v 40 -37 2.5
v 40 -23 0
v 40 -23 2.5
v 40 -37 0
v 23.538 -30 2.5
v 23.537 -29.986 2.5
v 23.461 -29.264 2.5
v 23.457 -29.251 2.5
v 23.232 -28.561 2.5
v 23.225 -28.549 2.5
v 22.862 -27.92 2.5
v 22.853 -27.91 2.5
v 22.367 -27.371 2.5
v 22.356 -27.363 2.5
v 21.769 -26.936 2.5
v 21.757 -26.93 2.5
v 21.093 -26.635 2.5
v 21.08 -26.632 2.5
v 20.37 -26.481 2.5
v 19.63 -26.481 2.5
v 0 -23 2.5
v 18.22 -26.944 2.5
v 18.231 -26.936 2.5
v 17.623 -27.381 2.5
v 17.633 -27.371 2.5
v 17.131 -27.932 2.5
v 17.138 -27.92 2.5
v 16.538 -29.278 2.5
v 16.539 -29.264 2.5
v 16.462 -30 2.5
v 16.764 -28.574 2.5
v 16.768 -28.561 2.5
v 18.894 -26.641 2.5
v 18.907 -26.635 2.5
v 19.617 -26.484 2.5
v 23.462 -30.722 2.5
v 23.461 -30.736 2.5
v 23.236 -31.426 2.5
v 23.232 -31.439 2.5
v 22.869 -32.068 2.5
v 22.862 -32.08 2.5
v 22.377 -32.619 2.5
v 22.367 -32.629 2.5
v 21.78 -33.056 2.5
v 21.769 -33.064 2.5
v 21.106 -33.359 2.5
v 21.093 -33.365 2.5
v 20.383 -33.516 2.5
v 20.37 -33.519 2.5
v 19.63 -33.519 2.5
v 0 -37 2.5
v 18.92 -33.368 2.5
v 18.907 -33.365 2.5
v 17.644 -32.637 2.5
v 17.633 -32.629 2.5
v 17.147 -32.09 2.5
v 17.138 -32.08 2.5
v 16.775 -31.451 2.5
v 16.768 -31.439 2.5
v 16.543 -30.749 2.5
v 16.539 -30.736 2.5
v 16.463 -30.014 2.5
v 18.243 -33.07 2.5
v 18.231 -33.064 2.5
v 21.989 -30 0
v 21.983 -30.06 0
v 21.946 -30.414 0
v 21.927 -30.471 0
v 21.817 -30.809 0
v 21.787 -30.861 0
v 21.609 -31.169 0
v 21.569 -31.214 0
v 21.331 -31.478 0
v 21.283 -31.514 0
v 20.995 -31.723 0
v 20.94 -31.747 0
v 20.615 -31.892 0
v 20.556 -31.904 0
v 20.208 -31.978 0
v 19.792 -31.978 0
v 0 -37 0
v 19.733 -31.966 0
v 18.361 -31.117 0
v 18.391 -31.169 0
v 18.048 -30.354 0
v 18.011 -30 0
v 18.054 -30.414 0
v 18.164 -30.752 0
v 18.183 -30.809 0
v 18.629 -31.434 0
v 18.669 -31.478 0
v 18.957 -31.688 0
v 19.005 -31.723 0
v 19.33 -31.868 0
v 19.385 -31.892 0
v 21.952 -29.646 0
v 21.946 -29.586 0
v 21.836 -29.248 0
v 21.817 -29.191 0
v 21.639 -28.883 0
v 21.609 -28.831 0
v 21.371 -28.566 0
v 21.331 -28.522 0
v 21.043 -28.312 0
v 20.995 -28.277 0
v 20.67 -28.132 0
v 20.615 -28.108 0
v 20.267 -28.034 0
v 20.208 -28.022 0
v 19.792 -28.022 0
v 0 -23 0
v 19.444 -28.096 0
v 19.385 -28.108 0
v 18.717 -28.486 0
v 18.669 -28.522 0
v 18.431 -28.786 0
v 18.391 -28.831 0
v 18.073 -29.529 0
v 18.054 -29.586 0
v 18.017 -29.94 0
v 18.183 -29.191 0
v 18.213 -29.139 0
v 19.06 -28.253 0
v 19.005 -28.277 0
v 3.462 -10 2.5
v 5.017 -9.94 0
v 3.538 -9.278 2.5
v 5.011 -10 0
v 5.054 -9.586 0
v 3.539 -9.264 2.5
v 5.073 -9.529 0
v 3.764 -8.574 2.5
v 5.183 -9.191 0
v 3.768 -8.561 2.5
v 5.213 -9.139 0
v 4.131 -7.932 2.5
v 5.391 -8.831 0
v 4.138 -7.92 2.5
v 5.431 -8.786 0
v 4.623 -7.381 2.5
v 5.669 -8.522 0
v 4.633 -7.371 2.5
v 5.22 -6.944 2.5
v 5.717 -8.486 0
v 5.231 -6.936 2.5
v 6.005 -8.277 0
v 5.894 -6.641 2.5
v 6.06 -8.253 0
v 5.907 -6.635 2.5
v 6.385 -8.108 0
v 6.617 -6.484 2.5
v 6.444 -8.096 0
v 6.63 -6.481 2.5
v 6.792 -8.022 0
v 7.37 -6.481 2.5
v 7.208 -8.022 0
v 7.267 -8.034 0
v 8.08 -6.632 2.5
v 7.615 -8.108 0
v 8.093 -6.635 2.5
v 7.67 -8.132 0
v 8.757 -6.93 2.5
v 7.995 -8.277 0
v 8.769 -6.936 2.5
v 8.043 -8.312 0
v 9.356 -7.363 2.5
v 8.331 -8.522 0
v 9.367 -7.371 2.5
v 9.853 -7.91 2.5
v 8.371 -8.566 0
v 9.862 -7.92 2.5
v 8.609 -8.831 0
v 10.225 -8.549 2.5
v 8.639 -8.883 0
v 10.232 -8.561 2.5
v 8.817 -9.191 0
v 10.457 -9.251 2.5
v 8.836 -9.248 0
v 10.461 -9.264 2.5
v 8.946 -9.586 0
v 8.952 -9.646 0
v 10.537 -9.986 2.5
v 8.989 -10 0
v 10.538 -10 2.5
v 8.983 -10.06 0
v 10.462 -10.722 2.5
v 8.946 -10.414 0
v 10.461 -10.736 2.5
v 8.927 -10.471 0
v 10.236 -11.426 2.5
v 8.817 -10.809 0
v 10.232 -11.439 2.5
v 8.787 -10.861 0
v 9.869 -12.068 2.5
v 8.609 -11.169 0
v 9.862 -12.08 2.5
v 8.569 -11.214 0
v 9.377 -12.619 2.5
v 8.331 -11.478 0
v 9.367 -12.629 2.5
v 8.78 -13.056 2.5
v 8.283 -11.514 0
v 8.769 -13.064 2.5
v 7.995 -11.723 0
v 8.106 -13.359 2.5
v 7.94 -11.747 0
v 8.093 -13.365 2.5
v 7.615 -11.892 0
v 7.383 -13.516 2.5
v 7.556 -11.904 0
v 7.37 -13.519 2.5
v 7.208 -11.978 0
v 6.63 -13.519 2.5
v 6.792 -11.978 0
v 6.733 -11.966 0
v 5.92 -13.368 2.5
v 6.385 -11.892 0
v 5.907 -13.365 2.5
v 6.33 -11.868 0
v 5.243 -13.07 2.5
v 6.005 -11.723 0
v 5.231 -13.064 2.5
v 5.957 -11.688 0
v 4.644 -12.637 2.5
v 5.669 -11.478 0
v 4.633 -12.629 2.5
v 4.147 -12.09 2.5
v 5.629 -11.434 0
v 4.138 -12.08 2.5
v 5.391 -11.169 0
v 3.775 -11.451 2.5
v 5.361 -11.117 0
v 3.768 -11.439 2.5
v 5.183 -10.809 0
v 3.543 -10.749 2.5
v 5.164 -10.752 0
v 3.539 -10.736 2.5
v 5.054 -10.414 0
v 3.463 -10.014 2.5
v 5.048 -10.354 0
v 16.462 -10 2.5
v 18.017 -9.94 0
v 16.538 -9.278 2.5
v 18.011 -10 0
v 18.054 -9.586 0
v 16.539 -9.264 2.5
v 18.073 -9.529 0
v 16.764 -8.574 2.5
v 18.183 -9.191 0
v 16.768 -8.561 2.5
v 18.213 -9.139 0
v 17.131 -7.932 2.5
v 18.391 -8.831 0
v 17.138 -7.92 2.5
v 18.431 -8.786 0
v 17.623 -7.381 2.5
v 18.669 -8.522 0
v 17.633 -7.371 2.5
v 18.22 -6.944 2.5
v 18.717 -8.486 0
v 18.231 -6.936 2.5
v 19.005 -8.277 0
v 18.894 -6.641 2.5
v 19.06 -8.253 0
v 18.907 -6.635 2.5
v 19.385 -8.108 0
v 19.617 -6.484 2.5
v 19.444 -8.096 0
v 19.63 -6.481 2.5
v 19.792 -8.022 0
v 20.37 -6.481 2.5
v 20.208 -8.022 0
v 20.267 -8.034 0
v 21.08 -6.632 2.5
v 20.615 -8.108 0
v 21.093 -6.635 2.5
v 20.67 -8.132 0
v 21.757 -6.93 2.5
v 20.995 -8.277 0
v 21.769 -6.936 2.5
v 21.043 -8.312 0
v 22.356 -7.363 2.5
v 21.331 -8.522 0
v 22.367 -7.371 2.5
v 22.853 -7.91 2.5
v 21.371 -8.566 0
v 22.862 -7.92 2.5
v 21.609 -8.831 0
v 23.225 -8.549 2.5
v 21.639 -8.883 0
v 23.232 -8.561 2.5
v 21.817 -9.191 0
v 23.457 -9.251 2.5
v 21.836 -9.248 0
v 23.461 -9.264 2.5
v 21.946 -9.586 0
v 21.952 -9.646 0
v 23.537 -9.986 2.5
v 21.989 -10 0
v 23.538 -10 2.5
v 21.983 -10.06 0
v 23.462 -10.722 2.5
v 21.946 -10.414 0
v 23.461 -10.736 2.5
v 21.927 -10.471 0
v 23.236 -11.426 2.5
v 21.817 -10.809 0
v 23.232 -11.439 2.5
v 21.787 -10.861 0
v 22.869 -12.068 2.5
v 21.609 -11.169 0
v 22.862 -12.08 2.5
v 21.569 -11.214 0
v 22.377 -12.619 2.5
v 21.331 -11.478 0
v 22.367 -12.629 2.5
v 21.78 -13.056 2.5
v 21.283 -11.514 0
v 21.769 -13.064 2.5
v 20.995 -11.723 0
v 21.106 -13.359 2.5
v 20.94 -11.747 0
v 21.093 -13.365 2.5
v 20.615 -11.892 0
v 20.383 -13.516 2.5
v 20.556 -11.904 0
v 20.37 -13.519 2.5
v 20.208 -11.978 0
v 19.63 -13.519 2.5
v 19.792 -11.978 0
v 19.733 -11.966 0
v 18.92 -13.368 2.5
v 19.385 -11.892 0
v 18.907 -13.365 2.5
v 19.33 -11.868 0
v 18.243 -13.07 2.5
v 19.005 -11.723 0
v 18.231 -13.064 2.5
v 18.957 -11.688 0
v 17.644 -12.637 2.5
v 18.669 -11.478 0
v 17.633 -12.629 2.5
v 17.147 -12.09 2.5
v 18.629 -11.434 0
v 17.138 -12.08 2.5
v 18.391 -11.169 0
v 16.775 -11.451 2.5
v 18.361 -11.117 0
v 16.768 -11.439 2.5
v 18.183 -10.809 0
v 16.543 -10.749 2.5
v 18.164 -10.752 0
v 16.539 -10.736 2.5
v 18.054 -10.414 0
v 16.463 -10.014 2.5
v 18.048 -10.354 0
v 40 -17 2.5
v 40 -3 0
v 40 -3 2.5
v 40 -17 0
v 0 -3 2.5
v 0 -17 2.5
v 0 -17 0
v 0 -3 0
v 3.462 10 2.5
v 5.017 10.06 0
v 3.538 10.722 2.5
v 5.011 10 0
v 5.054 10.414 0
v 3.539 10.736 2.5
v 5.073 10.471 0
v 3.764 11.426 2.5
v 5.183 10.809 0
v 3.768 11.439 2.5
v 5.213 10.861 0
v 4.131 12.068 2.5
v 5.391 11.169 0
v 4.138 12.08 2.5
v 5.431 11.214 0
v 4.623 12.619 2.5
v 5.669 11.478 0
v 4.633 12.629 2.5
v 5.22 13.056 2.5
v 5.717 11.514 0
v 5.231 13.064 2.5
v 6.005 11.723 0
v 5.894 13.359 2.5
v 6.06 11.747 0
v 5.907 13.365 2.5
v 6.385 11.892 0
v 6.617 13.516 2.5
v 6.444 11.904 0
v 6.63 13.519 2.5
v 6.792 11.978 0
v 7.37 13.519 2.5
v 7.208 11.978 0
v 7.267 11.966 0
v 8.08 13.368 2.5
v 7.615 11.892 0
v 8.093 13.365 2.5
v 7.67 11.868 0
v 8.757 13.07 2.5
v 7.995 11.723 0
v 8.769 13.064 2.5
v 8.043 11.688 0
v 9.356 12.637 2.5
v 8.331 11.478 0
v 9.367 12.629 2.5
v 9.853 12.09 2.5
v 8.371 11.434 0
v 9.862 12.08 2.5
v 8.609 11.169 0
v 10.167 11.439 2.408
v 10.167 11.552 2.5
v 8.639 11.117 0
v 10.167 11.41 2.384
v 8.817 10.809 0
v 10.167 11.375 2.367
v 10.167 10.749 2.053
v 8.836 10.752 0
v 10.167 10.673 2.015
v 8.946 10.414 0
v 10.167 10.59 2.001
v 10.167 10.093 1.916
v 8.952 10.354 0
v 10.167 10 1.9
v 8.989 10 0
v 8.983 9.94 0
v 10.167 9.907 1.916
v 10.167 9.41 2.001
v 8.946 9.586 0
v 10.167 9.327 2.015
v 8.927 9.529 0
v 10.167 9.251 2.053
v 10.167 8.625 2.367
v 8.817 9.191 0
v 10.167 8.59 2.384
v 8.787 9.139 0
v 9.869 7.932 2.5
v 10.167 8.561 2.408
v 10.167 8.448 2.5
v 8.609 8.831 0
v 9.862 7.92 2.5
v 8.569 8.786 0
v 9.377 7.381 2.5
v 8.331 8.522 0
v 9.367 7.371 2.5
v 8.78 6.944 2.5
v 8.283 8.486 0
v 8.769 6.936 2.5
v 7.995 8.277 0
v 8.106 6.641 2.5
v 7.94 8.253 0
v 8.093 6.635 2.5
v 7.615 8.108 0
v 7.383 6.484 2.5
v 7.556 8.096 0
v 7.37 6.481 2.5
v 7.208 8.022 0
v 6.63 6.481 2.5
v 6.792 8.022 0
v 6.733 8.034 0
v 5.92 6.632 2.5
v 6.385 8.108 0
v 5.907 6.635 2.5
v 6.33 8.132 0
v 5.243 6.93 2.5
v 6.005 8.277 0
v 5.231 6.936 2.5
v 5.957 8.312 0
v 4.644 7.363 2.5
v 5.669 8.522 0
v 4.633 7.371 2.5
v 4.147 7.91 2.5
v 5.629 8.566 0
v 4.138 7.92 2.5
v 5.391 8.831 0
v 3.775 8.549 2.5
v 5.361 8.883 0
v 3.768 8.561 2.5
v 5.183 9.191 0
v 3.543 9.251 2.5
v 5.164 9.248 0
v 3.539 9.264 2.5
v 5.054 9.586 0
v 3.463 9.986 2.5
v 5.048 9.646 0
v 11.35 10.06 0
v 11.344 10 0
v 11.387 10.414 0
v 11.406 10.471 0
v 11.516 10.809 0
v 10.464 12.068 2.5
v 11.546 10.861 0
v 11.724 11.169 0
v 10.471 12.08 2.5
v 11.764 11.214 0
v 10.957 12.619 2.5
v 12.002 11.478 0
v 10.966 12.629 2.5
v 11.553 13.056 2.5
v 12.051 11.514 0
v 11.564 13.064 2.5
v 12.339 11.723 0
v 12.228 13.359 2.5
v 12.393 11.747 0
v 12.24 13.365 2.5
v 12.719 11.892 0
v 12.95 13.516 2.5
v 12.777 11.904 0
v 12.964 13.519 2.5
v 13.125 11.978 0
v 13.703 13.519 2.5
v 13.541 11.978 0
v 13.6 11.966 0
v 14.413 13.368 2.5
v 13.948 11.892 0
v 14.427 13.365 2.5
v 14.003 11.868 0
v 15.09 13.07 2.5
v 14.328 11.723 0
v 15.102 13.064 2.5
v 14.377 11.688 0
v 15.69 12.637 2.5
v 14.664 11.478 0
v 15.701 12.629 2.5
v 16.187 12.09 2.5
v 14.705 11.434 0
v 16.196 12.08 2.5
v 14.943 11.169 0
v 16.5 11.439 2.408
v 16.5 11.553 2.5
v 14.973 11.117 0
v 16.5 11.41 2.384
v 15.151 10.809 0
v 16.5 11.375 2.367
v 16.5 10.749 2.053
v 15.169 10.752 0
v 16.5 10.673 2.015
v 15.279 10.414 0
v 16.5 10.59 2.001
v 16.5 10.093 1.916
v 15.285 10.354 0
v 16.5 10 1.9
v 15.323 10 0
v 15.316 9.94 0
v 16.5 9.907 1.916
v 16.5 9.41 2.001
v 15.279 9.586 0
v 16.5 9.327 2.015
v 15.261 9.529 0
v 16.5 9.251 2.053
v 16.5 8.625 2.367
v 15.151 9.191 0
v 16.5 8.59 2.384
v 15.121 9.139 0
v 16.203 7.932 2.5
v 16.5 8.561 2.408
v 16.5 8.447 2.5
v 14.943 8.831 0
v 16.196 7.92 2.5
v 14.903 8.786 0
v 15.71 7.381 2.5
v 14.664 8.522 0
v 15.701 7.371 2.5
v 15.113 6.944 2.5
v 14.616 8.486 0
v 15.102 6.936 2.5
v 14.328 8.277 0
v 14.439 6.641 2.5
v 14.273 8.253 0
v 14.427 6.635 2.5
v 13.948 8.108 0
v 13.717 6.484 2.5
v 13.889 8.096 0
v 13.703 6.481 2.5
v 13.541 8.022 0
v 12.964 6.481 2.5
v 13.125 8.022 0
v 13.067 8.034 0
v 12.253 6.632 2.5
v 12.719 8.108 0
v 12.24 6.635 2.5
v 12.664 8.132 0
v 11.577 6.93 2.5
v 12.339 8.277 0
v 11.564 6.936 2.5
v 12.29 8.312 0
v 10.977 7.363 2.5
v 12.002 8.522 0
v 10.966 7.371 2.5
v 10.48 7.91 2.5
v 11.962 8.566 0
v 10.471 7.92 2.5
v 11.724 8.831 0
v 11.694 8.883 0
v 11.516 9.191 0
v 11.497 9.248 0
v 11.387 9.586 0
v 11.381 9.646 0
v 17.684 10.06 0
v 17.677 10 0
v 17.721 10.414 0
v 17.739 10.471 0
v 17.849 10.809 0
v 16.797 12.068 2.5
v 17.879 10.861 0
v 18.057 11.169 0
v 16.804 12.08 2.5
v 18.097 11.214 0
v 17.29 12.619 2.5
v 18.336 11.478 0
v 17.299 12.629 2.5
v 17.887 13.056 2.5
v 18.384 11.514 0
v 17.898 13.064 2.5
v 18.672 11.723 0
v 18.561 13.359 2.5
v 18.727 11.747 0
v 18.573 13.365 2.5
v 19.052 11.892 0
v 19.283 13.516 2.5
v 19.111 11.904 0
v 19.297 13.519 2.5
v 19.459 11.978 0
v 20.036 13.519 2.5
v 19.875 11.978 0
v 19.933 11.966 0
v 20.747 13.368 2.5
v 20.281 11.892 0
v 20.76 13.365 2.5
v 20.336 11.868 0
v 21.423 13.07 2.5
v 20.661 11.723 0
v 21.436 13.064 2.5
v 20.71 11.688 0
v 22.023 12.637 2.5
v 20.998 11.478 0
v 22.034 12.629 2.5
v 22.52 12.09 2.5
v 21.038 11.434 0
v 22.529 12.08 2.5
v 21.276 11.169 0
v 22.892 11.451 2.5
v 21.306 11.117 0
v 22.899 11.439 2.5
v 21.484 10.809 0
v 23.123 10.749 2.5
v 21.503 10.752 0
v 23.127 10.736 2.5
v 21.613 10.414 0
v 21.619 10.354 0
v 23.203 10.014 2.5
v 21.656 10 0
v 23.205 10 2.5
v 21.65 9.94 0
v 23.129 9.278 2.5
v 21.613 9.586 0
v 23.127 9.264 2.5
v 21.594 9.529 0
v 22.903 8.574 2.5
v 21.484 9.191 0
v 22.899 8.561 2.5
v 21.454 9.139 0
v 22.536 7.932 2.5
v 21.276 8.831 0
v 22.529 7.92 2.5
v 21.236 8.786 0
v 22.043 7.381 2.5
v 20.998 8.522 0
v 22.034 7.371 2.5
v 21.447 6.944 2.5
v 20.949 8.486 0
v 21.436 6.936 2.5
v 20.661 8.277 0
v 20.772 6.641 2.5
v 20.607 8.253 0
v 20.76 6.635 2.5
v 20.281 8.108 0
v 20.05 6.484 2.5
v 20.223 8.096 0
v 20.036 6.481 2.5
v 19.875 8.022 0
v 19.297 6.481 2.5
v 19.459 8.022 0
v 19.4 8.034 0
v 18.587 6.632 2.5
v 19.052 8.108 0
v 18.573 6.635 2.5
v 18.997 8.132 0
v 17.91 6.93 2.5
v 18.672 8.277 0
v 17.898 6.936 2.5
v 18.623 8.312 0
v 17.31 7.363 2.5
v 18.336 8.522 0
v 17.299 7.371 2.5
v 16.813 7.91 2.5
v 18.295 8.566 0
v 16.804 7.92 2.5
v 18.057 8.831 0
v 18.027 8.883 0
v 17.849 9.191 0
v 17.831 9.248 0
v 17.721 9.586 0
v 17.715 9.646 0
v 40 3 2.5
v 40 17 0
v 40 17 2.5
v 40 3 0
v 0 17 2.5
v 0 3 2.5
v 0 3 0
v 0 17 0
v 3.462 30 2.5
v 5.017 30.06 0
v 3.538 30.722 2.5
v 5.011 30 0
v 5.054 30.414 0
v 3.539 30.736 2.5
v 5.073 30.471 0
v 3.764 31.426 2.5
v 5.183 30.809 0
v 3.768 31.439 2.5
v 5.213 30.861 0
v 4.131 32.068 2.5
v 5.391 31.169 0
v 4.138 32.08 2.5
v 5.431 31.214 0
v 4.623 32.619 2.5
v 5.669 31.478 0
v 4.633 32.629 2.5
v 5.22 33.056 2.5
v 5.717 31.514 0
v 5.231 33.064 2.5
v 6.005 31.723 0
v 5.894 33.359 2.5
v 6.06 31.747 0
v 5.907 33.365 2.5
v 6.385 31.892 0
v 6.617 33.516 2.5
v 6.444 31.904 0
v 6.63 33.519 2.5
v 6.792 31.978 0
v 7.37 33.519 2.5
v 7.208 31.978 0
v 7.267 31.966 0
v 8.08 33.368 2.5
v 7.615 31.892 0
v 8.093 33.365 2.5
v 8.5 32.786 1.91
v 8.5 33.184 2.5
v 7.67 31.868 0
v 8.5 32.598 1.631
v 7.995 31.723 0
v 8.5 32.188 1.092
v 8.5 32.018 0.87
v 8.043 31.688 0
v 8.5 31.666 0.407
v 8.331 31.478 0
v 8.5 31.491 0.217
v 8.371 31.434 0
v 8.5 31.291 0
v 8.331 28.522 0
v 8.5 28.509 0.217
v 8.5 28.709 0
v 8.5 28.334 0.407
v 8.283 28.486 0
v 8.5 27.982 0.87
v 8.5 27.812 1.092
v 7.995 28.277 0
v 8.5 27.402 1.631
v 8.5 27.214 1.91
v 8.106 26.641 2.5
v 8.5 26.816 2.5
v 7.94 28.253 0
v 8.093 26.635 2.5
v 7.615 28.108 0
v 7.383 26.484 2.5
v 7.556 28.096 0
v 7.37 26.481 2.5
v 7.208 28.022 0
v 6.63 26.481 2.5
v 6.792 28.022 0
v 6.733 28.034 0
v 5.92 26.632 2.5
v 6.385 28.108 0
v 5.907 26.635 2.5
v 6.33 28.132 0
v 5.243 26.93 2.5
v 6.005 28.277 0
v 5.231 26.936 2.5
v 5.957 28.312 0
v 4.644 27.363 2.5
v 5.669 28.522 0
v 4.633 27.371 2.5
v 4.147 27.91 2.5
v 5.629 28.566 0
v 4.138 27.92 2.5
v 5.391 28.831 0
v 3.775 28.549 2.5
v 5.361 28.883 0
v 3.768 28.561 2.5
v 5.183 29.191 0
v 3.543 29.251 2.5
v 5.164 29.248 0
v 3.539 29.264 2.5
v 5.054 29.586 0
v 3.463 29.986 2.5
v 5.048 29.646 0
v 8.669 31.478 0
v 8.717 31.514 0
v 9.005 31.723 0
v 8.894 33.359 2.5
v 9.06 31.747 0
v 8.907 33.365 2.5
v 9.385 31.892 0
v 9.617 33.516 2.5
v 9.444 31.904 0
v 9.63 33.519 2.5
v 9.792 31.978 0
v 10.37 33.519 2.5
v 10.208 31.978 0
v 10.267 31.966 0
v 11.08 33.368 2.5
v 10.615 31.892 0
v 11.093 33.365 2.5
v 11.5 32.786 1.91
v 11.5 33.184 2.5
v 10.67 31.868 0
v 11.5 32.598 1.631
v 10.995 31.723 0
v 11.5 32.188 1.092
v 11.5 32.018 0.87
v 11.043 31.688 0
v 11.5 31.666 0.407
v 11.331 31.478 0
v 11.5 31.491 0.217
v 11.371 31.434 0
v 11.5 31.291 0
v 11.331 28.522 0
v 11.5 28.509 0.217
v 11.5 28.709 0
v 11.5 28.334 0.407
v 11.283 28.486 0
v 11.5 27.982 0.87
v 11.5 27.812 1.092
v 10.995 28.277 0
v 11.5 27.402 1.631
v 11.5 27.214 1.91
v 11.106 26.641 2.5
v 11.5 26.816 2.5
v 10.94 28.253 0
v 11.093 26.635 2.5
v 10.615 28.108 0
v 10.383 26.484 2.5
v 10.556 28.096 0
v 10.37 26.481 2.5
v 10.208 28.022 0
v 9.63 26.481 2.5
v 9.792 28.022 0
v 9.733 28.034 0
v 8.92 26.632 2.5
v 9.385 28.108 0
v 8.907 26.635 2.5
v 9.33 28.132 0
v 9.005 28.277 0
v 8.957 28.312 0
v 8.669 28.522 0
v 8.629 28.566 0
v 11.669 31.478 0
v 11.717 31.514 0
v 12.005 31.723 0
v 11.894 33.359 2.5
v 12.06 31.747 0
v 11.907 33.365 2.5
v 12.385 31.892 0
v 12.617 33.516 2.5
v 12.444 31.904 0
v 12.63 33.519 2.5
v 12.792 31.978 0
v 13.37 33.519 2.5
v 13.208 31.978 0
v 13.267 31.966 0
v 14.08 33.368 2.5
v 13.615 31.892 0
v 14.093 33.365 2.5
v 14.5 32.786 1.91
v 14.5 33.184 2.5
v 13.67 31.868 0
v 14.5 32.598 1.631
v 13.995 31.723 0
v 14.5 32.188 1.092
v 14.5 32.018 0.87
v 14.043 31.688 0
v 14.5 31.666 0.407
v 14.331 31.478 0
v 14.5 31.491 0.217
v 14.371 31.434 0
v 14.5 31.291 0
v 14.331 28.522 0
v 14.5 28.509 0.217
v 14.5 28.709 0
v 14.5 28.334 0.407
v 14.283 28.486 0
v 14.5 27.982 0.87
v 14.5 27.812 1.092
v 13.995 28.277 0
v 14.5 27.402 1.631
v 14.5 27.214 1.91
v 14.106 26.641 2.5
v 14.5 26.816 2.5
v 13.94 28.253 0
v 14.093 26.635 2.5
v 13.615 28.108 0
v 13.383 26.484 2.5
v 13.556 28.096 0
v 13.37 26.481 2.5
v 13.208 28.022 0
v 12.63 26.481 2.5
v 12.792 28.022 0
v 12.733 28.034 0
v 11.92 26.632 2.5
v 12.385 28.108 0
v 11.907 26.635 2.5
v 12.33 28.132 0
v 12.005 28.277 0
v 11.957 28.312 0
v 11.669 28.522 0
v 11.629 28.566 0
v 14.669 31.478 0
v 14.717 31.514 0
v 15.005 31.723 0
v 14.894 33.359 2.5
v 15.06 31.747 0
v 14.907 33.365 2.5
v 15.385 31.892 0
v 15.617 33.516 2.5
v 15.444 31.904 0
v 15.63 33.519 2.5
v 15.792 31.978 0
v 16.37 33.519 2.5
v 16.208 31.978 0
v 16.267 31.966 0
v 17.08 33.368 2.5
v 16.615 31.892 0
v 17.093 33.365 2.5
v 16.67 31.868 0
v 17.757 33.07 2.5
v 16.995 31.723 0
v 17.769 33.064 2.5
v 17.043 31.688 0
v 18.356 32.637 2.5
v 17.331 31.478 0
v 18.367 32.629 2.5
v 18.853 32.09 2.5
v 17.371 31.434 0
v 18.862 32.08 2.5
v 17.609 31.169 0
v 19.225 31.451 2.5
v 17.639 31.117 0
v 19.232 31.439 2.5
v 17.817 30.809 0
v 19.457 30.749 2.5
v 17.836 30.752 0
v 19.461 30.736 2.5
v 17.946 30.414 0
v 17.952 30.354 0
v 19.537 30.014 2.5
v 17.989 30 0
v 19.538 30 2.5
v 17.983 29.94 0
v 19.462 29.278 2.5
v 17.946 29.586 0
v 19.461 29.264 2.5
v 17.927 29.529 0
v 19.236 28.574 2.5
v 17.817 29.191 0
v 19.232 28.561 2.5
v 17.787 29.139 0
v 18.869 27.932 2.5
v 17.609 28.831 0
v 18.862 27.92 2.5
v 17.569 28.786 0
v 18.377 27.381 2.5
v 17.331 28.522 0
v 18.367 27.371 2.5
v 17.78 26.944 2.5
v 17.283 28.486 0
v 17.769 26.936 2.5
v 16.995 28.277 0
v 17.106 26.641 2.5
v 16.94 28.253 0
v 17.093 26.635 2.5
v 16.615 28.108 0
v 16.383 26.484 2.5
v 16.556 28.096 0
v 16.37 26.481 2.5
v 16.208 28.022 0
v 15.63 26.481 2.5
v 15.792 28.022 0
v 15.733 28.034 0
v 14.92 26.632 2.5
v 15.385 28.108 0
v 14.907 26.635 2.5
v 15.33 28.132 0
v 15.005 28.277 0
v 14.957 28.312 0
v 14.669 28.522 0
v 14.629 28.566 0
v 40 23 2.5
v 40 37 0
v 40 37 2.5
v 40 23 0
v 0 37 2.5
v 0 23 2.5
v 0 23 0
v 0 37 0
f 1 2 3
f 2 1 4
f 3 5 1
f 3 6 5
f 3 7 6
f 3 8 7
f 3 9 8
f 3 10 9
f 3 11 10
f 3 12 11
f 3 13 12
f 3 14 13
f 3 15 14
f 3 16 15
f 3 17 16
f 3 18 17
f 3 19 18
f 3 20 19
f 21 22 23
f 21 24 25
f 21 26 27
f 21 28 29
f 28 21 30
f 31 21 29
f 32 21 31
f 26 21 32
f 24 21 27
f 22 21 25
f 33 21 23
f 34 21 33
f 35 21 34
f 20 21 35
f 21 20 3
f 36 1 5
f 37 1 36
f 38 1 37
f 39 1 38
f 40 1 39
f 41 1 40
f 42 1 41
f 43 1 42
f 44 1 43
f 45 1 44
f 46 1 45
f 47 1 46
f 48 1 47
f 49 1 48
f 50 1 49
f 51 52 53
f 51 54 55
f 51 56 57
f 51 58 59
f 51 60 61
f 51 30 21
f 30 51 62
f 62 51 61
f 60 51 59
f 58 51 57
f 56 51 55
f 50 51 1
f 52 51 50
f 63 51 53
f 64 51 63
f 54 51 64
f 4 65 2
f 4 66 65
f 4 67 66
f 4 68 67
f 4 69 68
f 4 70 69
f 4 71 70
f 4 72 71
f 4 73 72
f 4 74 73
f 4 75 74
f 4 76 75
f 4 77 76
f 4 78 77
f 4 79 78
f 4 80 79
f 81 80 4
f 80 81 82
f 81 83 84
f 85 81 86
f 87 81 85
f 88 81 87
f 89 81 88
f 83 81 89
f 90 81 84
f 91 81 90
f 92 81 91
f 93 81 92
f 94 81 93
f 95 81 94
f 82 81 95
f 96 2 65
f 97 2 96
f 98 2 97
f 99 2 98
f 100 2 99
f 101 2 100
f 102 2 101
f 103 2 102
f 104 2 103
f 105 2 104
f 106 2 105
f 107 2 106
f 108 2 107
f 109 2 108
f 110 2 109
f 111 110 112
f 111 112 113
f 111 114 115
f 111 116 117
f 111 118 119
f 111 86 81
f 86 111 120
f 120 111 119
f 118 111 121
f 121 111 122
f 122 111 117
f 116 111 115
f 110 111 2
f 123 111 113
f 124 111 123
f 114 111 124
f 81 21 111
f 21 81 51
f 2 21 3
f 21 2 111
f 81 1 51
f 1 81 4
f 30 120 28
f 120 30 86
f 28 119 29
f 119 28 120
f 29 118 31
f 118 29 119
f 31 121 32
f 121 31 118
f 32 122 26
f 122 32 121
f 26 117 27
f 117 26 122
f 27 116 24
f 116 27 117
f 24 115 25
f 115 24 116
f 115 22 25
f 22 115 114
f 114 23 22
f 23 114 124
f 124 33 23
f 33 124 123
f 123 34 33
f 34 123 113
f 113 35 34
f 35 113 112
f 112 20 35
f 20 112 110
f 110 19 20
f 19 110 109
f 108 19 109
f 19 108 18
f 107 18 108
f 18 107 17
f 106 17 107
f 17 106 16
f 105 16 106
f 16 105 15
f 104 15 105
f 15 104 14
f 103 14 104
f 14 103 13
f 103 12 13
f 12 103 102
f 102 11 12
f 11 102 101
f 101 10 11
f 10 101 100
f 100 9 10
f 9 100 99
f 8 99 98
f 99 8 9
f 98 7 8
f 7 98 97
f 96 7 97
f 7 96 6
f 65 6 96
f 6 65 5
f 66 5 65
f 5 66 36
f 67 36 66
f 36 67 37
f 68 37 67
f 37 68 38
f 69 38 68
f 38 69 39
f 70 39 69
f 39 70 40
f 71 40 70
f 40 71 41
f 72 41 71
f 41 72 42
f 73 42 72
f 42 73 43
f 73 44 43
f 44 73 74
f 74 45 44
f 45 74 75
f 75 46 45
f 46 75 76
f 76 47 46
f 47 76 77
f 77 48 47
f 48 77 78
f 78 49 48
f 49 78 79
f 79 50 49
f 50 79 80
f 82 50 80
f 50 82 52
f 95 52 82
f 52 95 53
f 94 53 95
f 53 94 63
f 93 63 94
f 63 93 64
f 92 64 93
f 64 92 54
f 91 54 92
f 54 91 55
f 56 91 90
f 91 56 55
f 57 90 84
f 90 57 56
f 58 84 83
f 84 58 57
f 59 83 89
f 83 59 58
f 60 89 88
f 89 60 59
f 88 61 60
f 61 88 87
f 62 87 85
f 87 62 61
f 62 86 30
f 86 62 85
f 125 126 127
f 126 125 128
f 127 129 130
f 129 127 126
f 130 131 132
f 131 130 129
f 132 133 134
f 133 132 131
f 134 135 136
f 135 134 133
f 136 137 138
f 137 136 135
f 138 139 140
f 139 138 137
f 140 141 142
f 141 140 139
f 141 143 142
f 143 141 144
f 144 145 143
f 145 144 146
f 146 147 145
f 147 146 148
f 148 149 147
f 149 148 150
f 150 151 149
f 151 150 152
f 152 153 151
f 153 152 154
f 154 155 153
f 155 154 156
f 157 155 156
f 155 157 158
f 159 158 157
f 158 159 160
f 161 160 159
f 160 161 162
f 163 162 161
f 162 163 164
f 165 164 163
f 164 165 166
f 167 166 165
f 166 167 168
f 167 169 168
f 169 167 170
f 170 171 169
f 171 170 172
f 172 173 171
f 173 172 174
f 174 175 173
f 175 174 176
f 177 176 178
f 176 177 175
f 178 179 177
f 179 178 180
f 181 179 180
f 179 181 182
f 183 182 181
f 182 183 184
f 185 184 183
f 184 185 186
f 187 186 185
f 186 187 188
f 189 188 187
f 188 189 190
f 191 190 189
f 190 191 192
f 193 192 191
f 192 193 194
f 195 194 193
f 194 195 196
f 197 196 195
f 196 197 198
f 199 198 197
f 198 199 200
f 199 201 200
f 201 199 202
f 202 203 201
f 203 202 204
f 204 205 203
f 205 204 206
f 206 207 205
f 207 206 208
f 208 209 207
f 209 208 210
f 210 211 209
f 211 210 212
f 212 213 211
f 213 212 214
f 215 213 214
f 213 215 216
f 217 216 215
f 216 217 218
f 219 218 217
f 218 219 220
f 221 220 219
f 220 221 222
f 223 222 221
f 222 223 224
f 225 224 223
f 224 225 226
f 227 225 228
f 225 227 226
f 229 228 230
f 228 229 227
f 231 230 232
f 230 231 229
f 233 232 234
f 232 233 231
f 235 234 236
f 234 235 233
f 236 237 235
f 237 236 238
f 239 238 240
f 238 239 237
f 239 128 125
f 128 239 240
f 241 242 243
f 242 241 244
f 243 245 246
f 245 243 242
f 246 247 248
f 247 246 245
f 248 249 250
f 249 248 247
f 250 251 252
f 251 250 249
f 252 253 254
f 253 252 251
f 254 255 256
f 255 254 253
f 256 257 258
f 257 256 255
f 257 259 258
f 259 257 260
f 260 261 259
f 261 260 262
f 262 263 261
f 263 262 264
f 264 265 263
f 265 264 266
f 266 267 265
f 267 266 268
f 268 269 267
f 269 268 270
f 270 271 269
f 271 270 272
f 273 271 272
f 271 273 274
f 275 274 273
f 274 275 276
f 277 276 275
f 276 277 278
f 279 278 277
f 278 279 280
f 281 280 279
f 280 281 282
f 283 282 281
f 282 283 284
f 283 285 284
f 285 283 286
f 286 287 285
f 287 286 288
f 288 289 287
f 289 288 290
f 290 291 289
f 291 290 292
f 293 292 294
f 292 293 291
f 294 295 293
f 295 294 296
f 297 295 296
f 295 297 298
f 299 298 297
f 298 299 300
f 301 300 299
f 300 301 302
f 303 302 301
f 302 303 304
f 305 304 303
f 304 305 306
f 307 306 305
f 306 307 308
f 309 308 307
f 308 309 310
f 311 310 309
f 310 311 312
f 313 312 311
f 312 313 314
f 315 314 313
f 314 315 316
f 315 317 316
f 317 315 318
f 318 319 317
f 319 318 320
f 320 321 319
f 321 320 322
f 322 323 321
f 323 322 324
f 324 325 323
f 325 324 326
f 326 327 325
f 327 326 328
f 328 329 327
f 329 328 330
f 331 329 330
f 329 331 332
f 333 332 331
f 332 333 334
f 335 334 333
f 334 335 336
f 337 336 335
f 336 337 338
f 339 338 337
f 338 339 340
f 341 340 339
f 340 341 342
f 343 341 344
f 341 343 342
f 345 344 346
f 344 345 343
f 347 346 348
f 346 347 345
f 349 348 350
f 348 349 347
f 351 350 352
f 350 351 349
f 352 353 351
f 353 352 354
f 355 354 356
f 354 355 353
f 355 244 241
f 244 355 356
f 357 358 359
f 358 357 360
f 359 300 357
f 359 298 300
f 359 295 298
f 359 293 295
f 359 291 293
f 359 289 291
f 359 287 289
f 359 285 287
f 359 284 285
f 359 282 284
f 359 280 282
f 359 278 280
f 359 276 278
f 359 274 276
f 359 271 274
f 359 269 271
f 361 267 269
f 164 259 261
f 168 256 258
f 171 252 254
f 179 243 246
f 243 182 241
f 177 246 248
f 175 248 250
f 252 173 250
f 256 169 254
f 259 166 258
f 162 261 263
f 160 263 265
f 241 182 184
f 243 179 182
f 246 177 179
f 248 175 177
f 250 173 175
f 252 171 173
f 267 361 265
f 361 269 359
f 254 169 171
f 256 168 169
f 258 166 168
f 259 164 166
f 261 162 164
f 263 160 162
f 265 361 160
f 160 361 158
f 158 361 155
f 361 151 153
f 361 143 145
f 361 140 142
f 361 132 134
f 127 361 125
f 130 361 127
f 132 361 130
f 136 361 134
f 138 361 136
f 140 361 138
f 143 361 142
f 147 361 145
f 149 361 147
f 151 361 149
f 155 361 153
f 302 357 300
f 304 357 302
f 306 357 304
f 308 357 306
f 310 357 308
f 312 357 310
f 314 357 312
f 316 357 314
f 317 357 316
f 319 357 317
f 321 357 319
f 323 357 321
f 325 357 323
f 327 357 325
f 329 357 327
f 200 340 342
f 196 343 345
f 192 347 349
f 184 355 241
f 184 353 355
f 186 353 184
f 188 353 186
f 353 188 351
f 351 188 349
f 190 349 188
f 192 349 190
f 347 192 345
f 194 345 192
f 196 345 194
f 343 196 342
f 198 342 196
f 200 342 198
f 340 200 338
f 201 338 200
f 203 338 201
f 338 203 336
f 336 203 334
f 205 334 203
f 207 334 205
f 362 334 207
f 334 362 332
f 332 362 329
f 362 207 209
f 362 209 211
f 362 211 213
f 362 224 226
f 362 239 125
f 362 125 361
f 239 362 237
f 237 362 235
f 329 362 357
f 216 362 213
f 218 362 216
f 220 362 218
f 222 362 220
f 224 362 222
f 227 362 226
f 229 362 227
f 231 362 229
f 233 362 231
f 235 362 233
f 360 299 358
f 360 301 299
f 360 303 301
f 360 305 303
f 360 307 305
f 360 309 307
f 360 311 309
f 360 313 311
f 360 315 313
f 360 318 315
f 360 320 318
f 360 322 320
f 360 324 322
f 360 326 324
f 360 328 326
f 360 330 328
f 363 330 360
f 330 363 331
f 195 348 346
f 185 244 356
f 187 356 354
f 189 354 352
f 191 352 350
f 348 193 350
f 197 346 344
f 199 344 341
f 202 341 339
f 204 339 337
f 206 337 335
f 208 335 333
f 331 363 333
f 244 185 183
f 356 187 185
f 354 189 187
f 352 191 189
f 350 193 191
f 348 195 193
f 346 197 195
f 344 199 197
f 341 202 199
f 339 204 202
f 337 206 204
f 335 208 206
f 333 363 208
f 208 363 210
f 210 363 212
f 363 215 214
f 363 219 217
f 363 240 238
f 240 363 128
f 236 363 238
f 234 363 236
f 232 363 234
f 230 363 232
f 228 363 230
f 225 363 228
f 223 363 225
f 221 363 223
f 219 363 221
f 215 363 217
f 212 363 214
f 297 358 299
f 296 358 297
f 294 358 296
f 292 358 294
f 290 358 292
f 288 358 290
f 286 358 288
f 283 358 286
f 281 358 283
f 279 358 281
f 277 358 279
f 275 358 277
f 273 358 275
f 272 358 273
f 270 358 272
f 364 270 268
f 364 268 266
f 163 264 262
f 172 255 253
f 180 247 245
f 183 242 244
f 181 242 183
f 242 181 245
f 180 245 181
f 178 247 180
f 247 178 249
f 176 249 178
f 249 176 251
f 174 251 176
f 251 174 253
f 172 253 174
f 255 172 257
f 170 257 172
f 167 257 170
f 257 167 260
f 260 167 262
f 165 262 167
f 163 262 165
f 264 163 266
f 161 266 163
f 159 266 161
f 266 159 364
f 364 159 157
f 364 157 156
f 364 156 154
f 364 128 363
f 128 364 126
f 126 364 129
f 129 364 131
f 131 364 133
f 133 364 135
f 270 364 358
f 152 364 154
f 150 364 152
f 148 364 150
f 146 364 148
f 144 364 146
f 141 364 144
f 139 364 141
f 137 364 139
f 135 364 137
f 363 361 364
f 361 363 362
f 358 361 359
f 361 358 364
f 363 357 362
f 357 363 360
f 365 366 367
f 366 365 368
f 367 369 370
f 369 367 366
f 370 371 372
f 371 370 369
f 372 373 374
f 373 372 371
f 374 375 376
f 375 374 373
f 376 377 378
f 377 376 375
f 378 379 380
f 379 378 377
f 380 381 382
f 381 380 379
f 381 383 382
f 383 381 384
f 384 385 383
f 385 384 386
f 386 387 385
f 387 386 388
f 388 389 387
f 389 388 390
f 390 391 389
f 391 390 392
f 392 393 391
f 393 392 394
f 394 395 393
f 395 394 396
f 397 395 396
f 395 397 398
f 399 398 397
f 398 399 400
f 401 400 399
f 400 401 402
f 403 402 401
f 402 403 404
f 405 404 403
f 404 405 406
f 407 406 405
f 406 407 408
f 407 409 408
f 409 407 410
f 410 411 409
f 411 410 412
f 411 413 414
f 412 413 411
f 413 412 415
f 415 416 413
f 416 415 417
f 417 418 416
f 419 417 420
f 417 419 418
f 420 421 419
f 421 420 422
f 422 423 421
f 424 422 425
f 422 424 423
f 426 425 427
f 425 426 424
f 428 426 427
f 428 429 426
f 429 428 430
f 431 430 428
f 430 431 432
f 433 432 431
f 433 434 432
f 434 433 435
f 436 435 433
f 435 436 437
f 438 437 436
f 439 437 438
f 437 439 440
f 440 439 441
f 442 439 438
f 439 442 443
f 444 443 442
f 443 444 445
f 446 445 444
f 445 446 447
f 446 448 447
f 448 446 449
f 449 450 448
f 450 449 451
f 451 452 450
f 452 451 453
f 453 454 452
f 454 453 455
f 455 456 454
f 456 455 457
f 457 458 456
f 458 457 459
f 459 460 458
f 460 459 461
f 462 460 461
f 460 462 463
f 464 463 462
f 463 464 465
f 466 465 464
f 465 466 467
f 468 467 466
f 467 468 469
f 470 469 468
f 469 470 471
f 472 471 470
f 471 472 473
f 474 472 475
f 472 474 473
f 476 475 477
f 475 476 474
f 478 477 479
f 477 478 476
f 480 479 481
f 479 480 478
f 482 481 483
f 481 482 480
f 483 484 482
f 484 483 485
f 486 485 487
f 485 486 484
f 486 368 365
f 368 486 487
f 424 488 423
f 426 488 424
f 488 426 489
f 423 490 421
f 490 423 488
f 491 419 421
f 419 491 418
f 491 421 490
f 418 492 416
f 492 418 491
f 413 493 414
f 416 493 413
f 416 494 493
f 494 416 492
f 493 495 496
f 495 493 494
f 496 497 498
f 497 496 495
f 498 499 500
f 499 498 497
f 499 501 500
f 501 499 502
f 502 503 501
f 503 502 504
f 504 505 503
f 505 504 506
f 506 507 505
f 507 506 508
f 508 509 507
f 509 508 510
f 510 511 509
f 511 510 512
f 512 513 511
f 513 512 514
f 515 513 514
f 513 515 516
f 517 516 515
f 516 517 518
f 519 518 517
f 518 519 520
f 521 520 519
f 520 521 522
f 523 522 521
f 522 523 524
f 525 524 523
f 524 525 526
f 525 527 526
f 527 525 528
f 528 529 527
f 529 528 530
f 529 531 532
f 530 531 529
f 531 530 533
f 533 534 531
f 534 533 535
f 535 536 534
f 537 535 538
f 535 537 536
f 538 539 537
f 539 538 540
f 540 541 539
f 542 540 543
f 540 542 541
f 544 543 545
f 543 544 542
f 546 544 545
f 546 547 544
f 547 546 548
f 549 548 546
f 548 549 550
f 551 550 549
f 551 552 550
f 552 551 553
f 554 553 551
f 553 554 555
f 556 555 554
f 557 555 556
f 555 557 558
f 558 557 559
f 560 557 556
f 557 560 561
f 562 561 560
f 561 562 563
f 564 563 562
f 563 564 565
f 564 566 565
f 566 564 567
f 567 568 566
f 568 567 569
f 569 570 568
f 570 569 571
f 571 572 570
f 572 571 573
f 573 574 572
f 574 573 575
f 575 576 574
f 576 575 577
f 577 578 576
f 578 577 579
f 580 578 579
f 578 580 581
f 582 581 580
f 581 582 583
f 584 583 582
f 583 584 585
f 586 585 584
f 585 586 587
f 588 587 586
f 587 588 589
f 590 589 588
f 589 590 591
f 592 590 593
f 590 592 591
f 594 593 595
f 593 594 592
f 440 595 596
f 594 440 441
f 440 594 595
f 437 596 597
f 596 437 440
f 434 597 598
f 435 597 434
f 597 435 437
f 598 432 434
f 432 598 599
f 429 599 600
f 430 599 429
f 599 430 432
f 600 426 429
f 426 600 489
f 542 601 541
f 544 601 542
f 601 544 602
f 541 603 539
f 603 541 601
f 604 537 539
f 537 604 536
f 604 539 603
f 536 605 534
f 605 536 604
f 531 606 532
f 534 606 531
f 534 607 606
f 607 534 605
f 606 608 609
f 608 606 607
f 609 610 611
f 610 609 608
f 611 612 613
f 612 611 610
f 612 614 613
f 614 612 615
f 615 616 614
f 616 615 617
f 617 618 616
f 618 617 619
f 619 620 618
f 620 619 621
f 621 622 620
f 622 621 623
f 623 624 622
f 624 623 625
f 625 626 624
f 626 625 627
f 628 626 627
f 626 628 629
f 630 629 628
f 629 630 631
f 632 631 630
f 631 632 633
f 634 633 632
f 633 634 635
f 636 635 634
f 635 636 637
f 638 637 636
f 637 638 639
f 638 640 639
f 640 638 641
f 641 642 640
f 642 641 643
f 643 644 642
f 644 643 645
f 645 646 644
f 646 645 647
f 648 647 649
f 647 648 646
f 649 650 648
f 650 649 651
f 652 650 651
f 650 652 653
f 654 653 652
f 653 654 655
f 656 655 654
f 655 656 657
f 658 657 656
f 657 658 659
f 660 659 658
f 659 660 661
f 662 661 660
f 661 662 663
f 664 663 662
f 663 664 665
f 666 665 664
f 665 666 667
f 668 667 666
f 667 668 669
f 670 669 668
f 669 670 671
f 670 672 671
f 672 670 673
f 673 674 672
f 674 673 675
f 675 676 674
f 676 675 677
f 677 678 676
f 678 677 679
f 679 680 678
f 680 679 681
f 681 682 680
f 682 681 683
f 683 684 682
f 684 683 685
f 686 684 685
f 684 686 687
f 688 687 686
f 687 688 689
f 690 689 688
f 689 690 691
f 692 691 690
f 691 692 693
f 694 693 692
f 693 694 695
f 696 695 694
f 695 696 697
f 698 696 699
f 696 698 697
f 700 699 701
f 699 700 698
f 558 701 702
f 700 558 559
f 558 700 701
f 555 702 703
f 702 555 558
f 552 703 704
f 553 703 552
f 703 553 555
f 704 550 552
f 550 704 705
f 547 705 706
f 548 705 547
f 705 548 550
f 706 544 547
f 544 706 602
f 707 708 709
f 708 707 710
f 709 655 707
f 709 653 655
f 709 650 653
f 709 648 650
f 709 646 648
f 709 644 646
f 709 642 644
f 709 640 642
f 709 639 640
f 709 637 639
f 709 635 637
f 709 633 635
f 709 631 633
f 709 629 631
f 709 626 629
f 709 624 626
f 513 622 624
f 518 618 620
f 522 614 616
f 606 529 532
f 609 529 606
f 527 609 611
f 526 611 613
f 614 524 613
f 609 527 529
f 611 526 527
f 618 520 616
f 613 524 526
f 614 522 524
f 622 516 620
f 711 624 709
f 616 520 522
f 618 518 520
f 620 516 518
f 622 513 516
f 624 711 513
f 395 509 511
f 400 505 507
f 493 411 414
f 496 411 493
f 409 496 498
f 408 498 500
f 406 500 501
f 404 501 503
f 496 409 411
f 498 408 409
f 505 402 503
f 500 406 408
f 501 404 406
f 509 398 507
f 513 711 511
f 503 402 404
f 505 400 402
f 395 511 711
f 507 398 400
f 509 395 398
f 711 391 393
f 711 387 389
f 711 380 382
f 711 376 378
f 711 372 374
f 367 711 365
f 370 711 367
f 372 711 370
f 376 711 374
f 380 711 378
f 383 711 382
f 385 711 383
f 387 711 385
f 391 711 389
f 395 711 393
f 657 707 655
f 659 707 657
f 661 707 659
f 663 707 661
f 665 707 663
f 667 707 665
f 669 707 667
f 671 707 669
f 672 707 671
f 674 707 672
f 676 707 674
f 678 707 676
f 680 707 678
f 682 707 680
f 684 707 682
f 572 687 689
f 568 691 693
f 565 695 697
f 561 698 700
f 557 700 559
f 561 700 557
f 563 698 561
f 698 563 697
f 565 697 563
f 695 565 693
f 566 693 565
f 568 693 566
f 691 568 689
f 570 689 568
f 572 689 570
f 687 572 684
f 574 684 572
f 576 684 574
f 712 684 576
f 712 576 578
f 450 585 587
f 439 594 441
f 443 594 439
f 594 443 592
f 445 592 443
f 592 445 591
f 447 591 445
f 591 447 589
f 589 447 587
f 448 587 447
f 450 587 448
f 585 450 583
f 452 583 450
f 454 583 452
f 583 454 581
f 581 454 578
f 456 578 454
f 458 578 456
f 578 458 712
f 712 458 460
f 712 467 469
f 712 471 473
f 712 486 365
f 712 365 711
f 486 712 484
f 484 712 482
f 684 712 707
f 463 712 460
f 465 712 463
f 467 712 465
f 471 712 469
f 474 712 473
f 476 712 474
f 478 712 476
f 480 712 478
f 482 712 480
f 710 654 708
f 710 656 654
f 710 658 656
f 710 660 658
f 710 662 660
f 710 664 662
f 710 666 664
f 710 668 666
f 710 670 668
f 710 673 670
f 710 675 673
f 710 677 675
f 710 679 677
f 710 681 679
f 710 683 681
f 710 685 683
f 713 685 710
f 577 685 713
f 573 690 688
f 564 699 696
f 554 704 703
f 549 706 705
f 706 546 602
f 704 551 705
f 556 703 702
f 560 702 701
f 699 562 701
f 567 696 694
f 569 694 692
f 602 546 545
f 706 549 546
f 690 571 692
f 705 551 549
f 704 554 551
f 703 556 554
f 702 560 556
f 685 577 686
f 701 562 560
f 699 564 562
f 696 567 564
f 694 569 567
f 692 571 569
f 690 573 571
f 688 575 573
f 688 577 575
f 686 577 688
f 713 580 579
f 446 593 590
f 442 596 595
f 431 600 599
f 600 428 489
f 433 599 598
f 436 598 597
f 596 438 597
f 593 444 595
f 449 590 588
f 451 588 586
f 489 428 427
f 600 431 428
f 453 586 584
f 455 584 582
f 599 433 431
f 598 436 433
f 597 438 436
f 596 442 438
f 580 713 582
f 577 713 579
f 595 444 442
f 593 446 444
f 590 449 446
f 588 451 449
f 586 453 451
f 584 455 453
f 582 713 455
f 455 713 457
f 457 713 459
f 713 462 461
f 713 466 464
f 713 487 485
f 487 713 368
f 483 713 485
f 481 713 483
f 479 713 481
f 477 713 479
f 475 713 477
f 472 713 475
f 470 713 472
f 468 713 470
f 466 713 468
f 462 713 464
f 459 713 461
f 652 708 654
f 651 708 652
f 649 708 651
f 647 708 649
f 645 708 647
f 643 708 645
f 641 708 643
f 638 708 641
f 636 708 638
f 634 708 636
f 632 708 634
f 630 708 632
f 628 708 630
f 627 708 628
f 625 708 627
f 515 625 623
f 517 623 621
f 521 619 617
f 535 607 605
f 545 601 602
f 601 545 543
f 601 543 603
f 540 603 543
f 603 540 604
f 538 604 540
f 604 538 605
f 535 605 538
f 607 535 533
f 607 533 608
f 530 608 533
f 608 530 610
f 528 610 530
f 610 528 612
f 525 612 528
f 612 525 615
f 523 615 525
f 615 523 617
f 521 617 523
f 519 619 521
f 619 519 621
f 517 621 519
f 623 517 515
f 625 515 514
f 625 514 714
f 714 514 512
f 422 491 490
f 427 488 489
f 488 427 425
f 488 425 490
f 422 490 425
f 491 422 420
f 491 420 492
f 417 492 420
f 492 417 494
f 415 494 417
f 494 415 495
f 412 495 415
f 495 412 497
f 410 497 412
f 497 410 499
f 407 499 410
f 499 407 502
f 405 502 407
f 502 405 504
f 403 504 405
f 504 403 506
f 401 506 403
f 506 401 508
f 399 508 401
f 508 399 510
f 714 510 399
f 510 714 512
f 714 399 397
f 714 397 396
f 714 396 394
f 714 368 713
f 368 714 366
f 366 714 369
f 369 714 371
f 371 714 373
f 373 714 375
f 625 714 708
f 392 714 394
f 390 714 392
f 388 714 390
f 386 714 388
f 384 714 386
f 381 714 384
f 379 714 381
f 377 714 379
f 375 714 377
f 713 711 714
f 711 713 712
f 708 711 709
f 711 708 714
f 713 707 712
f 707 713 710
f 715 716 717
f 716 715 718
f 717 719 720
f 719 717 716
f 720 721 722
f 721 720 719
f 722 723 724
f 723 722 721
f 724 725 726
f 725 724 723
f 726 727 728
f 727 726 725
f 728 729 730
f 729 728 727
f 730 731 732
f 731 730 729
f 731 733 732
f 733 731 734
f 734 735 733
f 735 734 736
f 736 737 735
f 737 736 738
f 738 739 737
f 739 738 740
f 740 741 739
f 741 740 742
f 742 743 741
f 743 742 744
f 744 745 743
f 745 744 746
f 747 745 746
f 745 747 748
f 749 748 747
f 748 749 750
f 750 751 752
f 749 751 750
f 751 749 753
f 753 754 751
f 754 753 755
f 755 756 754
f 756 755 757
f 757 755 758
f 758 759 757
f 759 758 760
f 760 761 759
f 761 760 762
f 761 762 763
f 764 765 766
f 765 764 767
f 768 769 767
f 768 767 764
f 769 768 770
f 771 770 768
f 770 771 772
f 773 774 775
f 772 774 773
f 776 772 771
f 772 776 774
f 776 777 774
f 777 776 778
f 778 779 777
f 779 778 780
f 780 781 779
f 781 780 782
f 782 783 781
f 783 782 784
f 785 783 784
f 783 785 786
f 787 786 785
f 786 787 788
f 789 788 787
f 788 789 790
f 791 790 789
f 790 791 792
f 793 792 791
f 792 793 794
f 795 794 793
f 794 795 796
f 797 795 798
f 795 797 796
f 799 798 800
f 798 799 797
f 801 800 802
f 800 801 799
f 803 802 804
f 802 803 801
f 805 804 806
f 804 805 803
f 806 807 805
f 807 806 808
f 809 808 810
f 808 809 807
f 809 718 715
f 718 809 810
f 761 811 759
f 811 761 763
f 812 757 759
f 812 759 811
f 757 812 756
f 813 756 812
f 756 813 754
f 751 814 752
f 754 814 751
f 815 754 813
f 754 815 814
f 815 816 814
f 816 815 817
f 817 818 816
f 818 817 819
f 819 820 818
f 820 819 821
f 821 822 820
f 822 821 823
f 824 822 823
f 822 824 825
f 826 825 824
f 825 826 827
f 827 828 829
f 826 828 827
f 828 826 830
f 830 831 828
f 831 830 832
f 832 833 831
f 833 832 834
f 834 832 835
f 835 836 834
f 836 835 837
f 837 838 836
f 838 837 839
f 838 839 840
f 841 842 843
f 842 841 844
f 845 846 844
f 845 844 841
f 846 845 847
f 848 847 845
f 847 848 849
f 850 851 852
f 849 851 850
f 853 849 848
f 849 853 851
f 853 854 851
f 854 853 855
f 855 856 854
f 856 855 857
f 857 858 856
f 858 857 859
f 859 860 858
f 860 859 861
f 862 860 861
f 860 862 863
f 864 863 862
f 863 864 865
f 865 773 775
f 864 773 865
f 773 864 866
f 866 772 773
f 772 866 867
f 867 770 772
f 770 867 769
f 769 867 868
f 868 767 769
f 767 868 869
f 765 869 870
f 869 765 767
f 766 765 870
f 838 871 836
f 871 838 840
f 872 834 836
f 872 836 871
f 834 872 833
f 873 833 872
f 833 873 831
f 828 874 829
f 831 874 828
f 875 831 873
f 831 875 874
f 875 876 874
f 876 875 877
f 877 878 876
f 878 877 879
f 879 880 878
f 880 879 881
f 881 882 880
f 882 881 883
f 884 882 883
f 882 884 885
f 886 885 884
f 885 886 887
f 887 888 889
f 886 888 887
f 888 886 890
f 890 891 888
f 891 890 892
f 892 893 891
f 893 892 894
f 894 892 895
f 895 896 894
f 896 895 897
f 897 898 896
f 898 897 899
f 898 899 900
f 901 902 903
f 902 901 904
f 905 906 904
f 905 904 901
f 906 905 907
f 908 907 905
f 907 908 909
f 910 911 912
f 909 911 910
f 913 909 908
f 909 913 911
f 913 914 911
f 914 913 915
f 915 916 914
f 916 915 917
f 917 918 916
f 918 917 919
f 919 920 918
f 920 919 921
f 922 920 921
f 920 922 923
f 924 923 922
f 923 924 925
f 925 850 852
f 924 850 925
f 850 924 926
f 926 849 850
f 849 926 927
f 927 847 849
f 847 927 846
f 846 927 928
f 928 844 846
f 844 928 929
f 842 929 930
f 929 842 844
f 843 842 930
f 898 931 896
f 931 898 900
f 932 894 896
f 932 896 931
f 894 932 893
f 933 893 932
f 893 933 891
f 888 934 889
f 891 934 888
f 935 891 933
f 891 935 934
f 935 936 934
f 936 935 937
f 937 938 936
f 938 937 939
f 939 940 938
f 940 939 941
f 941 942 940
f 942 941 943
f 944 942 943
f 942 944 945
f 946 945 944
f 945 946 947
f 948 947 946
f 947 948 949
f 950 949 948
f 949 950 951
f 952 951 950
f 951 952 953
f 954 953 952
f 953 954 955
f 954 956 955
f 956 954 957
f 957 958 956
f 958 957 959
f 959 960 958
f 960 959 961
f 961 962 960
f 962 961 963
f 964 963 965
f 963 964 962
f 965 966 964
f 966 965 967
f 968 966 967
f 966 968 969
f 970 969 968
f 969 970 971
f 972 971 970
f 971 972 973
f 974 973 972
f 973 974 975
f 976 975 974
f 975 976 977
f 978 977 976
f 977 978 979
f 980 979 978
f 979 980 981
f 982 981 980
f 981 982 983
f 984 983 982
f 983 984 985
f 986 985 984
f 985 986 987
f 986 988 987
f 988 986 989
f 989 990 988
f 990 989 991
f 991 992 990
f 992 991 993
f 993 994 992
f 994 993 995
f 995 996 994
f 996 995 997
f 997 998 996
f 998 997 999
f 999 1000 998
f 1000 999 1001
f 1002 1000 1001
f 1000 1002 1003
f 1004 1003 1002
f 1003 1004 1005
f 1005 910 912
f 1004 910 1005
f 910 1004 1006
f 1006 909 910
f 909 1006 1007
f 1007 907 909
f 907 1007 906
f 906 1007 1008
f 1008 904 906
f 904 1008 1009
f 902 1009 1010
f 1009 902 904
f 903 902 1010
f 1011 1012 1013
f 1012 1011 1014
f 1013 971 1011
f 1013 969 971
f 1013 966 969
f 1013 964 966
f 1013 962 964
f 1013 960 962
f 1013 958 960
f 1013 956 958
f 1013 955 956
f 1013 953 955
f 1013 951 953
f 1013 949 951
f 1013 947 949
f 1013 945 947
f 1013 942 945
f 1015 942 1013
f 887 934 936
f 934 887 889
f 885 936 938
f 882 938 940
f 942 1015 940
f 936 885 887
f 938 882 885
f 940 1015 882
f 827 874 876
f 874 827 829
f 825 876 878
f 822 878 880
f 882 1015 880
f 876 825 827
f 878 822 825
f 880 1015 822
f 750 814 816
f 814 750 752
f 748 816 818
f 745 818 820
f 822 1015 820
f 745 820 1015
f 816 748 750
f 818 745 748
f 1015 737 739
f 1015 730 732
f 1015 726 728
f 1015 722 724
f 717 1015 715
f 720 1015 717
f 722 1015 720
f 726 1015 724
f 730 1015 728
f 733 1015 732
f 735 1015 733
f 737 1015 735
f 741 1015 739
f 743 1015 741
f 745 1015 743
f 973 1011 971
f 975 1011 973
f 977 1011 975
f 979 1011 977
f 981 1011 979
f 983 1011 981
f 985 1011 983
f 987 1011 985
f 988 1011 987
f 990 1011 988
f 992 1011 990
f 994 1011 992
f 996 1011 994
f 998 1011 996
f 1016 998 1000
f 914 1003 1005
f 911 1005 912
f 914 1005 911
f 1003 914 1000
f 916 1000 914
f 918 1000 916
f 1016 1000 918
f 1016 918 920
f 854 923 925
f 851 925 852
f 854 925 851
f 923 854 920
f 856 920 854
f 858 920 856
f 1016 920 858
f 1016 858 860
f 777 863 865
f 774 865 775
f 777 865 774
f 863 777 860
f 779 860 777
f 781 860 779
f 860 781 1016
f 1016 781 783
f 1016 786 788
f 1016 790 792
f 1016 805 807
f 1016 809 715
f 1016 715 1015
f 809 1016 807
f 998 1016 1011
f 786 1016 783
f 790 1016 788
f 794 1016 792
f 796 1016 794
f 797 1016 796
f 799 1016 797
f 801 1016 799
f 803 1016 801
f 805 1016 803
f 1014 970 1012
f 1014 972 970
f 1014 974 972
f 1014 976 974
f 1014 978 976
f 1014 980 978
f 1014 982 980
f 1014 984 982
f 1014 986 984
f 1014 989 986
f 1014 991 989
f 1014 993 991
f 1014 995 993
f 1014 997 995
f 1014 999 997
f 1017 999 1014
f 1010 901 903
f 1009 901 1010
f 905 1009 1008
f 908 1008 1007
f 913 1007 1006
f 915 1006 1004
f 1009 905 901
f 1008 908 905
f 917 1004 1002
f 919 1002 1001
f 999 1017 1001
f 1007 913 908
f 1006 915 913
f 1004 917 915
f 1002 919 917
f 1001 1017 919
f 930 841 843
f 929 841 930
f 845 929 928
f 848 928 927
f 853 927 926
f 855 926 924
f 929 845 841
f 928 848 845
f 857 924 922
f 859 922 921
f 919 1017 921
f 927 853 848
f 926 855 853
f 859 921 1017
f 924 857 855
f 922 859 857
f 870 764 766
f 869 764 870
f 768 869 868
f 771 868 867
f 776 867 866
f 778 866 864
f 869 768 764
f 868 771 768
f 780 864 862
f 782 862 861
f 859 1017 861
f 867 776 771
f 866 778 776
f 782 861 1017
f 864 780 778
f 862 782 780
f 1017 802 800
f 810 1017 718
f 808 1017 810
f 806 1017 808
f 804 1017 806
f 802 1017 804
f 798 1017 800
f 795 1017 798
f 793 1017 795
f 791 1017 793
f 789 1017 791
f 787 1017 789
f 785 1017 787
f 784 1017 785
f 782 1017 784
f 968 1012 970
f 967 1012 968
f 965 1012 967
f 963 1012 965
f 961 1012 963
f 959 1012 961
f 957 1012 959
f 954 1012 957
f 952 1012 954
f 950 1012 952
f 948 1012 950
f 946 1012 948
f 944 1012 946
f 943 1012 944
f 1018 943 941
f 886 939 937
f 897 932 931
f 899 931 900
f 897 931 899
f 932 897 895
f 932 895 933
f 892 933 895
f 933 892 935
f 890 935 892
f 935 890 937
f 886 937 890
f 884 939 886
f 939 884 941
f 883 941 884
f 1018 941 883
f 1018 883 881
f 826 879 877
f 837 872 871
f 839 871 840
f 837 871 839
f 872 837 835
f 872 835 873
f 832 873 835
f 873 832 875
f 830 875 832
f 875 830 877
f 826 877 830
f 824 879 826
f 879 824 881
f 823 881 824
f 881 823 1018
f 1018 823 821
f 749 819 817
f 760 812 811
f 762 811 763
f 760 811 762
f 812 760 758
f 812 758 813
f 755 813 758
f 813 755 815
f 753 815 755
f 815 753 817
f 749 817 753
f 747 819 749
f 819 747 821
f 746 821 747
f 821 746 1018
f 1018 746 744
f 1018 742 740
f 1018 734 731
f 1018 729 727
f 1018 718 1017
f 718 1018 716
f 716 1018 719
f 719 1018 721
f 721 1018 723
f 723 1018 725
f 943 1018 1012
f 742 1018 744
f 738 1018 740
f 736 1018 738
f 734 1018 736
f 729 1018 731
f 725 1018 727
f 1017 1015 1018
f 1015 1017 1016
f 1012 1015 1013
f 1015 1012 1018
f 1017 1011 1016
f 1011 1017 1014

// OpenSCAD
// file: Parts/Screw.scad
// created by IndiePandaaaaa | Lukas

function cone_diameter(diameter) = diameter * 2;

function cone_height(diameter) = diameter * 0.75;

module screw(diameter, length, cutout_sample = false, fs = 0.1, fa = 1) {
    //$fs = 0.1; [size in mm] | $fa = 1; [degrees]
    //$fn = 100; [defined faces]

    module base_model(diameter, length, cone_height, cone_diameter, offset = 0, fs = 0.1, fa = 1) {
        rotate_extrude($fs = fs) {
            polygon([
                    [0, 0],
                    [(diameter + offset) / 2, 0],
                    [(diameter + offset) / 2, (length + offset) - (cone_height + offset)],
                    [(cone_diameter + offset) / 2, length + offset],
                    [0, length + offset],
                ]);
        }
    }

    if (length < diameter) {
        echo("Screw is too short");
        length = diameter + 1;
        echo("New length is: ", length);
    }

    if (!cutout_sample) {
        translate([0, 0, - length])
            difference() {
                base_model(diameter, length, cone_height(diameter), cone_diameter(diameter));

                // top cross part
                translate([0, 0, length + 0.1 - (cone_height(diameter) - diameter / 2)])
                    difference() {
                        rotate([0, 0, 45])
                            rotate_extrude($fn = 4) {
                                polygon([
                                        [0, 0],
                                        [diameter * 1.4 / 2, 0],
                                        [cone_diameter(diameter) / 2, cone_height(diameter) - diameter / 2],
                                        [0, cone_height(diameter) - diameter / 2],
                                    ]);
                            }
                        for (i = [0 : 1 : 3]) {
                            rotate([0, 0, 90 * i])
                                translate([diameter / 3.18 / 2, diameter / 3.18 / 2, - 0.1])
                                    cube(cone_height(diameter) + 0.2);
                        }
                    }
            }
    } else {
        offset = 0.2;
        translate([0, 0, - length - offset / 2])
            base_model(diameter, length, cone_height(diameter), cone_diameter(diameter), offset);
    }
}

screw(3.5, 12);
// main file
// created by IndiePandaaaaa|Lukas
// encoding: utf-8

use <Parts/Screw.scad>

SCREW_OD = 3.5;
WIDTH = 40;

module support_plate(width, screw_od, screw_count=2, thickness=2.5) {
  translate([screw_od*2, 0, 0]) difference() {
    translate([-screw_od*2, -screw_od*2, 0]) cube([width, 4*screw_od, thickness]);
    for (i=[0:screw_count - 1]) {
      translate([(screw_count==1? (width - screw_od*4)/2:0) + (width - screw_od*2*screw_count) / screw_count * i, 0, thickness]) screw(screw_od, 12, true);
    }
  }
}

for (i=[1:4]) {
  translate([0, -50 + 20*i, 0]) support_plate(WIDTH, SCREW_OD, screw_count=i);
}
